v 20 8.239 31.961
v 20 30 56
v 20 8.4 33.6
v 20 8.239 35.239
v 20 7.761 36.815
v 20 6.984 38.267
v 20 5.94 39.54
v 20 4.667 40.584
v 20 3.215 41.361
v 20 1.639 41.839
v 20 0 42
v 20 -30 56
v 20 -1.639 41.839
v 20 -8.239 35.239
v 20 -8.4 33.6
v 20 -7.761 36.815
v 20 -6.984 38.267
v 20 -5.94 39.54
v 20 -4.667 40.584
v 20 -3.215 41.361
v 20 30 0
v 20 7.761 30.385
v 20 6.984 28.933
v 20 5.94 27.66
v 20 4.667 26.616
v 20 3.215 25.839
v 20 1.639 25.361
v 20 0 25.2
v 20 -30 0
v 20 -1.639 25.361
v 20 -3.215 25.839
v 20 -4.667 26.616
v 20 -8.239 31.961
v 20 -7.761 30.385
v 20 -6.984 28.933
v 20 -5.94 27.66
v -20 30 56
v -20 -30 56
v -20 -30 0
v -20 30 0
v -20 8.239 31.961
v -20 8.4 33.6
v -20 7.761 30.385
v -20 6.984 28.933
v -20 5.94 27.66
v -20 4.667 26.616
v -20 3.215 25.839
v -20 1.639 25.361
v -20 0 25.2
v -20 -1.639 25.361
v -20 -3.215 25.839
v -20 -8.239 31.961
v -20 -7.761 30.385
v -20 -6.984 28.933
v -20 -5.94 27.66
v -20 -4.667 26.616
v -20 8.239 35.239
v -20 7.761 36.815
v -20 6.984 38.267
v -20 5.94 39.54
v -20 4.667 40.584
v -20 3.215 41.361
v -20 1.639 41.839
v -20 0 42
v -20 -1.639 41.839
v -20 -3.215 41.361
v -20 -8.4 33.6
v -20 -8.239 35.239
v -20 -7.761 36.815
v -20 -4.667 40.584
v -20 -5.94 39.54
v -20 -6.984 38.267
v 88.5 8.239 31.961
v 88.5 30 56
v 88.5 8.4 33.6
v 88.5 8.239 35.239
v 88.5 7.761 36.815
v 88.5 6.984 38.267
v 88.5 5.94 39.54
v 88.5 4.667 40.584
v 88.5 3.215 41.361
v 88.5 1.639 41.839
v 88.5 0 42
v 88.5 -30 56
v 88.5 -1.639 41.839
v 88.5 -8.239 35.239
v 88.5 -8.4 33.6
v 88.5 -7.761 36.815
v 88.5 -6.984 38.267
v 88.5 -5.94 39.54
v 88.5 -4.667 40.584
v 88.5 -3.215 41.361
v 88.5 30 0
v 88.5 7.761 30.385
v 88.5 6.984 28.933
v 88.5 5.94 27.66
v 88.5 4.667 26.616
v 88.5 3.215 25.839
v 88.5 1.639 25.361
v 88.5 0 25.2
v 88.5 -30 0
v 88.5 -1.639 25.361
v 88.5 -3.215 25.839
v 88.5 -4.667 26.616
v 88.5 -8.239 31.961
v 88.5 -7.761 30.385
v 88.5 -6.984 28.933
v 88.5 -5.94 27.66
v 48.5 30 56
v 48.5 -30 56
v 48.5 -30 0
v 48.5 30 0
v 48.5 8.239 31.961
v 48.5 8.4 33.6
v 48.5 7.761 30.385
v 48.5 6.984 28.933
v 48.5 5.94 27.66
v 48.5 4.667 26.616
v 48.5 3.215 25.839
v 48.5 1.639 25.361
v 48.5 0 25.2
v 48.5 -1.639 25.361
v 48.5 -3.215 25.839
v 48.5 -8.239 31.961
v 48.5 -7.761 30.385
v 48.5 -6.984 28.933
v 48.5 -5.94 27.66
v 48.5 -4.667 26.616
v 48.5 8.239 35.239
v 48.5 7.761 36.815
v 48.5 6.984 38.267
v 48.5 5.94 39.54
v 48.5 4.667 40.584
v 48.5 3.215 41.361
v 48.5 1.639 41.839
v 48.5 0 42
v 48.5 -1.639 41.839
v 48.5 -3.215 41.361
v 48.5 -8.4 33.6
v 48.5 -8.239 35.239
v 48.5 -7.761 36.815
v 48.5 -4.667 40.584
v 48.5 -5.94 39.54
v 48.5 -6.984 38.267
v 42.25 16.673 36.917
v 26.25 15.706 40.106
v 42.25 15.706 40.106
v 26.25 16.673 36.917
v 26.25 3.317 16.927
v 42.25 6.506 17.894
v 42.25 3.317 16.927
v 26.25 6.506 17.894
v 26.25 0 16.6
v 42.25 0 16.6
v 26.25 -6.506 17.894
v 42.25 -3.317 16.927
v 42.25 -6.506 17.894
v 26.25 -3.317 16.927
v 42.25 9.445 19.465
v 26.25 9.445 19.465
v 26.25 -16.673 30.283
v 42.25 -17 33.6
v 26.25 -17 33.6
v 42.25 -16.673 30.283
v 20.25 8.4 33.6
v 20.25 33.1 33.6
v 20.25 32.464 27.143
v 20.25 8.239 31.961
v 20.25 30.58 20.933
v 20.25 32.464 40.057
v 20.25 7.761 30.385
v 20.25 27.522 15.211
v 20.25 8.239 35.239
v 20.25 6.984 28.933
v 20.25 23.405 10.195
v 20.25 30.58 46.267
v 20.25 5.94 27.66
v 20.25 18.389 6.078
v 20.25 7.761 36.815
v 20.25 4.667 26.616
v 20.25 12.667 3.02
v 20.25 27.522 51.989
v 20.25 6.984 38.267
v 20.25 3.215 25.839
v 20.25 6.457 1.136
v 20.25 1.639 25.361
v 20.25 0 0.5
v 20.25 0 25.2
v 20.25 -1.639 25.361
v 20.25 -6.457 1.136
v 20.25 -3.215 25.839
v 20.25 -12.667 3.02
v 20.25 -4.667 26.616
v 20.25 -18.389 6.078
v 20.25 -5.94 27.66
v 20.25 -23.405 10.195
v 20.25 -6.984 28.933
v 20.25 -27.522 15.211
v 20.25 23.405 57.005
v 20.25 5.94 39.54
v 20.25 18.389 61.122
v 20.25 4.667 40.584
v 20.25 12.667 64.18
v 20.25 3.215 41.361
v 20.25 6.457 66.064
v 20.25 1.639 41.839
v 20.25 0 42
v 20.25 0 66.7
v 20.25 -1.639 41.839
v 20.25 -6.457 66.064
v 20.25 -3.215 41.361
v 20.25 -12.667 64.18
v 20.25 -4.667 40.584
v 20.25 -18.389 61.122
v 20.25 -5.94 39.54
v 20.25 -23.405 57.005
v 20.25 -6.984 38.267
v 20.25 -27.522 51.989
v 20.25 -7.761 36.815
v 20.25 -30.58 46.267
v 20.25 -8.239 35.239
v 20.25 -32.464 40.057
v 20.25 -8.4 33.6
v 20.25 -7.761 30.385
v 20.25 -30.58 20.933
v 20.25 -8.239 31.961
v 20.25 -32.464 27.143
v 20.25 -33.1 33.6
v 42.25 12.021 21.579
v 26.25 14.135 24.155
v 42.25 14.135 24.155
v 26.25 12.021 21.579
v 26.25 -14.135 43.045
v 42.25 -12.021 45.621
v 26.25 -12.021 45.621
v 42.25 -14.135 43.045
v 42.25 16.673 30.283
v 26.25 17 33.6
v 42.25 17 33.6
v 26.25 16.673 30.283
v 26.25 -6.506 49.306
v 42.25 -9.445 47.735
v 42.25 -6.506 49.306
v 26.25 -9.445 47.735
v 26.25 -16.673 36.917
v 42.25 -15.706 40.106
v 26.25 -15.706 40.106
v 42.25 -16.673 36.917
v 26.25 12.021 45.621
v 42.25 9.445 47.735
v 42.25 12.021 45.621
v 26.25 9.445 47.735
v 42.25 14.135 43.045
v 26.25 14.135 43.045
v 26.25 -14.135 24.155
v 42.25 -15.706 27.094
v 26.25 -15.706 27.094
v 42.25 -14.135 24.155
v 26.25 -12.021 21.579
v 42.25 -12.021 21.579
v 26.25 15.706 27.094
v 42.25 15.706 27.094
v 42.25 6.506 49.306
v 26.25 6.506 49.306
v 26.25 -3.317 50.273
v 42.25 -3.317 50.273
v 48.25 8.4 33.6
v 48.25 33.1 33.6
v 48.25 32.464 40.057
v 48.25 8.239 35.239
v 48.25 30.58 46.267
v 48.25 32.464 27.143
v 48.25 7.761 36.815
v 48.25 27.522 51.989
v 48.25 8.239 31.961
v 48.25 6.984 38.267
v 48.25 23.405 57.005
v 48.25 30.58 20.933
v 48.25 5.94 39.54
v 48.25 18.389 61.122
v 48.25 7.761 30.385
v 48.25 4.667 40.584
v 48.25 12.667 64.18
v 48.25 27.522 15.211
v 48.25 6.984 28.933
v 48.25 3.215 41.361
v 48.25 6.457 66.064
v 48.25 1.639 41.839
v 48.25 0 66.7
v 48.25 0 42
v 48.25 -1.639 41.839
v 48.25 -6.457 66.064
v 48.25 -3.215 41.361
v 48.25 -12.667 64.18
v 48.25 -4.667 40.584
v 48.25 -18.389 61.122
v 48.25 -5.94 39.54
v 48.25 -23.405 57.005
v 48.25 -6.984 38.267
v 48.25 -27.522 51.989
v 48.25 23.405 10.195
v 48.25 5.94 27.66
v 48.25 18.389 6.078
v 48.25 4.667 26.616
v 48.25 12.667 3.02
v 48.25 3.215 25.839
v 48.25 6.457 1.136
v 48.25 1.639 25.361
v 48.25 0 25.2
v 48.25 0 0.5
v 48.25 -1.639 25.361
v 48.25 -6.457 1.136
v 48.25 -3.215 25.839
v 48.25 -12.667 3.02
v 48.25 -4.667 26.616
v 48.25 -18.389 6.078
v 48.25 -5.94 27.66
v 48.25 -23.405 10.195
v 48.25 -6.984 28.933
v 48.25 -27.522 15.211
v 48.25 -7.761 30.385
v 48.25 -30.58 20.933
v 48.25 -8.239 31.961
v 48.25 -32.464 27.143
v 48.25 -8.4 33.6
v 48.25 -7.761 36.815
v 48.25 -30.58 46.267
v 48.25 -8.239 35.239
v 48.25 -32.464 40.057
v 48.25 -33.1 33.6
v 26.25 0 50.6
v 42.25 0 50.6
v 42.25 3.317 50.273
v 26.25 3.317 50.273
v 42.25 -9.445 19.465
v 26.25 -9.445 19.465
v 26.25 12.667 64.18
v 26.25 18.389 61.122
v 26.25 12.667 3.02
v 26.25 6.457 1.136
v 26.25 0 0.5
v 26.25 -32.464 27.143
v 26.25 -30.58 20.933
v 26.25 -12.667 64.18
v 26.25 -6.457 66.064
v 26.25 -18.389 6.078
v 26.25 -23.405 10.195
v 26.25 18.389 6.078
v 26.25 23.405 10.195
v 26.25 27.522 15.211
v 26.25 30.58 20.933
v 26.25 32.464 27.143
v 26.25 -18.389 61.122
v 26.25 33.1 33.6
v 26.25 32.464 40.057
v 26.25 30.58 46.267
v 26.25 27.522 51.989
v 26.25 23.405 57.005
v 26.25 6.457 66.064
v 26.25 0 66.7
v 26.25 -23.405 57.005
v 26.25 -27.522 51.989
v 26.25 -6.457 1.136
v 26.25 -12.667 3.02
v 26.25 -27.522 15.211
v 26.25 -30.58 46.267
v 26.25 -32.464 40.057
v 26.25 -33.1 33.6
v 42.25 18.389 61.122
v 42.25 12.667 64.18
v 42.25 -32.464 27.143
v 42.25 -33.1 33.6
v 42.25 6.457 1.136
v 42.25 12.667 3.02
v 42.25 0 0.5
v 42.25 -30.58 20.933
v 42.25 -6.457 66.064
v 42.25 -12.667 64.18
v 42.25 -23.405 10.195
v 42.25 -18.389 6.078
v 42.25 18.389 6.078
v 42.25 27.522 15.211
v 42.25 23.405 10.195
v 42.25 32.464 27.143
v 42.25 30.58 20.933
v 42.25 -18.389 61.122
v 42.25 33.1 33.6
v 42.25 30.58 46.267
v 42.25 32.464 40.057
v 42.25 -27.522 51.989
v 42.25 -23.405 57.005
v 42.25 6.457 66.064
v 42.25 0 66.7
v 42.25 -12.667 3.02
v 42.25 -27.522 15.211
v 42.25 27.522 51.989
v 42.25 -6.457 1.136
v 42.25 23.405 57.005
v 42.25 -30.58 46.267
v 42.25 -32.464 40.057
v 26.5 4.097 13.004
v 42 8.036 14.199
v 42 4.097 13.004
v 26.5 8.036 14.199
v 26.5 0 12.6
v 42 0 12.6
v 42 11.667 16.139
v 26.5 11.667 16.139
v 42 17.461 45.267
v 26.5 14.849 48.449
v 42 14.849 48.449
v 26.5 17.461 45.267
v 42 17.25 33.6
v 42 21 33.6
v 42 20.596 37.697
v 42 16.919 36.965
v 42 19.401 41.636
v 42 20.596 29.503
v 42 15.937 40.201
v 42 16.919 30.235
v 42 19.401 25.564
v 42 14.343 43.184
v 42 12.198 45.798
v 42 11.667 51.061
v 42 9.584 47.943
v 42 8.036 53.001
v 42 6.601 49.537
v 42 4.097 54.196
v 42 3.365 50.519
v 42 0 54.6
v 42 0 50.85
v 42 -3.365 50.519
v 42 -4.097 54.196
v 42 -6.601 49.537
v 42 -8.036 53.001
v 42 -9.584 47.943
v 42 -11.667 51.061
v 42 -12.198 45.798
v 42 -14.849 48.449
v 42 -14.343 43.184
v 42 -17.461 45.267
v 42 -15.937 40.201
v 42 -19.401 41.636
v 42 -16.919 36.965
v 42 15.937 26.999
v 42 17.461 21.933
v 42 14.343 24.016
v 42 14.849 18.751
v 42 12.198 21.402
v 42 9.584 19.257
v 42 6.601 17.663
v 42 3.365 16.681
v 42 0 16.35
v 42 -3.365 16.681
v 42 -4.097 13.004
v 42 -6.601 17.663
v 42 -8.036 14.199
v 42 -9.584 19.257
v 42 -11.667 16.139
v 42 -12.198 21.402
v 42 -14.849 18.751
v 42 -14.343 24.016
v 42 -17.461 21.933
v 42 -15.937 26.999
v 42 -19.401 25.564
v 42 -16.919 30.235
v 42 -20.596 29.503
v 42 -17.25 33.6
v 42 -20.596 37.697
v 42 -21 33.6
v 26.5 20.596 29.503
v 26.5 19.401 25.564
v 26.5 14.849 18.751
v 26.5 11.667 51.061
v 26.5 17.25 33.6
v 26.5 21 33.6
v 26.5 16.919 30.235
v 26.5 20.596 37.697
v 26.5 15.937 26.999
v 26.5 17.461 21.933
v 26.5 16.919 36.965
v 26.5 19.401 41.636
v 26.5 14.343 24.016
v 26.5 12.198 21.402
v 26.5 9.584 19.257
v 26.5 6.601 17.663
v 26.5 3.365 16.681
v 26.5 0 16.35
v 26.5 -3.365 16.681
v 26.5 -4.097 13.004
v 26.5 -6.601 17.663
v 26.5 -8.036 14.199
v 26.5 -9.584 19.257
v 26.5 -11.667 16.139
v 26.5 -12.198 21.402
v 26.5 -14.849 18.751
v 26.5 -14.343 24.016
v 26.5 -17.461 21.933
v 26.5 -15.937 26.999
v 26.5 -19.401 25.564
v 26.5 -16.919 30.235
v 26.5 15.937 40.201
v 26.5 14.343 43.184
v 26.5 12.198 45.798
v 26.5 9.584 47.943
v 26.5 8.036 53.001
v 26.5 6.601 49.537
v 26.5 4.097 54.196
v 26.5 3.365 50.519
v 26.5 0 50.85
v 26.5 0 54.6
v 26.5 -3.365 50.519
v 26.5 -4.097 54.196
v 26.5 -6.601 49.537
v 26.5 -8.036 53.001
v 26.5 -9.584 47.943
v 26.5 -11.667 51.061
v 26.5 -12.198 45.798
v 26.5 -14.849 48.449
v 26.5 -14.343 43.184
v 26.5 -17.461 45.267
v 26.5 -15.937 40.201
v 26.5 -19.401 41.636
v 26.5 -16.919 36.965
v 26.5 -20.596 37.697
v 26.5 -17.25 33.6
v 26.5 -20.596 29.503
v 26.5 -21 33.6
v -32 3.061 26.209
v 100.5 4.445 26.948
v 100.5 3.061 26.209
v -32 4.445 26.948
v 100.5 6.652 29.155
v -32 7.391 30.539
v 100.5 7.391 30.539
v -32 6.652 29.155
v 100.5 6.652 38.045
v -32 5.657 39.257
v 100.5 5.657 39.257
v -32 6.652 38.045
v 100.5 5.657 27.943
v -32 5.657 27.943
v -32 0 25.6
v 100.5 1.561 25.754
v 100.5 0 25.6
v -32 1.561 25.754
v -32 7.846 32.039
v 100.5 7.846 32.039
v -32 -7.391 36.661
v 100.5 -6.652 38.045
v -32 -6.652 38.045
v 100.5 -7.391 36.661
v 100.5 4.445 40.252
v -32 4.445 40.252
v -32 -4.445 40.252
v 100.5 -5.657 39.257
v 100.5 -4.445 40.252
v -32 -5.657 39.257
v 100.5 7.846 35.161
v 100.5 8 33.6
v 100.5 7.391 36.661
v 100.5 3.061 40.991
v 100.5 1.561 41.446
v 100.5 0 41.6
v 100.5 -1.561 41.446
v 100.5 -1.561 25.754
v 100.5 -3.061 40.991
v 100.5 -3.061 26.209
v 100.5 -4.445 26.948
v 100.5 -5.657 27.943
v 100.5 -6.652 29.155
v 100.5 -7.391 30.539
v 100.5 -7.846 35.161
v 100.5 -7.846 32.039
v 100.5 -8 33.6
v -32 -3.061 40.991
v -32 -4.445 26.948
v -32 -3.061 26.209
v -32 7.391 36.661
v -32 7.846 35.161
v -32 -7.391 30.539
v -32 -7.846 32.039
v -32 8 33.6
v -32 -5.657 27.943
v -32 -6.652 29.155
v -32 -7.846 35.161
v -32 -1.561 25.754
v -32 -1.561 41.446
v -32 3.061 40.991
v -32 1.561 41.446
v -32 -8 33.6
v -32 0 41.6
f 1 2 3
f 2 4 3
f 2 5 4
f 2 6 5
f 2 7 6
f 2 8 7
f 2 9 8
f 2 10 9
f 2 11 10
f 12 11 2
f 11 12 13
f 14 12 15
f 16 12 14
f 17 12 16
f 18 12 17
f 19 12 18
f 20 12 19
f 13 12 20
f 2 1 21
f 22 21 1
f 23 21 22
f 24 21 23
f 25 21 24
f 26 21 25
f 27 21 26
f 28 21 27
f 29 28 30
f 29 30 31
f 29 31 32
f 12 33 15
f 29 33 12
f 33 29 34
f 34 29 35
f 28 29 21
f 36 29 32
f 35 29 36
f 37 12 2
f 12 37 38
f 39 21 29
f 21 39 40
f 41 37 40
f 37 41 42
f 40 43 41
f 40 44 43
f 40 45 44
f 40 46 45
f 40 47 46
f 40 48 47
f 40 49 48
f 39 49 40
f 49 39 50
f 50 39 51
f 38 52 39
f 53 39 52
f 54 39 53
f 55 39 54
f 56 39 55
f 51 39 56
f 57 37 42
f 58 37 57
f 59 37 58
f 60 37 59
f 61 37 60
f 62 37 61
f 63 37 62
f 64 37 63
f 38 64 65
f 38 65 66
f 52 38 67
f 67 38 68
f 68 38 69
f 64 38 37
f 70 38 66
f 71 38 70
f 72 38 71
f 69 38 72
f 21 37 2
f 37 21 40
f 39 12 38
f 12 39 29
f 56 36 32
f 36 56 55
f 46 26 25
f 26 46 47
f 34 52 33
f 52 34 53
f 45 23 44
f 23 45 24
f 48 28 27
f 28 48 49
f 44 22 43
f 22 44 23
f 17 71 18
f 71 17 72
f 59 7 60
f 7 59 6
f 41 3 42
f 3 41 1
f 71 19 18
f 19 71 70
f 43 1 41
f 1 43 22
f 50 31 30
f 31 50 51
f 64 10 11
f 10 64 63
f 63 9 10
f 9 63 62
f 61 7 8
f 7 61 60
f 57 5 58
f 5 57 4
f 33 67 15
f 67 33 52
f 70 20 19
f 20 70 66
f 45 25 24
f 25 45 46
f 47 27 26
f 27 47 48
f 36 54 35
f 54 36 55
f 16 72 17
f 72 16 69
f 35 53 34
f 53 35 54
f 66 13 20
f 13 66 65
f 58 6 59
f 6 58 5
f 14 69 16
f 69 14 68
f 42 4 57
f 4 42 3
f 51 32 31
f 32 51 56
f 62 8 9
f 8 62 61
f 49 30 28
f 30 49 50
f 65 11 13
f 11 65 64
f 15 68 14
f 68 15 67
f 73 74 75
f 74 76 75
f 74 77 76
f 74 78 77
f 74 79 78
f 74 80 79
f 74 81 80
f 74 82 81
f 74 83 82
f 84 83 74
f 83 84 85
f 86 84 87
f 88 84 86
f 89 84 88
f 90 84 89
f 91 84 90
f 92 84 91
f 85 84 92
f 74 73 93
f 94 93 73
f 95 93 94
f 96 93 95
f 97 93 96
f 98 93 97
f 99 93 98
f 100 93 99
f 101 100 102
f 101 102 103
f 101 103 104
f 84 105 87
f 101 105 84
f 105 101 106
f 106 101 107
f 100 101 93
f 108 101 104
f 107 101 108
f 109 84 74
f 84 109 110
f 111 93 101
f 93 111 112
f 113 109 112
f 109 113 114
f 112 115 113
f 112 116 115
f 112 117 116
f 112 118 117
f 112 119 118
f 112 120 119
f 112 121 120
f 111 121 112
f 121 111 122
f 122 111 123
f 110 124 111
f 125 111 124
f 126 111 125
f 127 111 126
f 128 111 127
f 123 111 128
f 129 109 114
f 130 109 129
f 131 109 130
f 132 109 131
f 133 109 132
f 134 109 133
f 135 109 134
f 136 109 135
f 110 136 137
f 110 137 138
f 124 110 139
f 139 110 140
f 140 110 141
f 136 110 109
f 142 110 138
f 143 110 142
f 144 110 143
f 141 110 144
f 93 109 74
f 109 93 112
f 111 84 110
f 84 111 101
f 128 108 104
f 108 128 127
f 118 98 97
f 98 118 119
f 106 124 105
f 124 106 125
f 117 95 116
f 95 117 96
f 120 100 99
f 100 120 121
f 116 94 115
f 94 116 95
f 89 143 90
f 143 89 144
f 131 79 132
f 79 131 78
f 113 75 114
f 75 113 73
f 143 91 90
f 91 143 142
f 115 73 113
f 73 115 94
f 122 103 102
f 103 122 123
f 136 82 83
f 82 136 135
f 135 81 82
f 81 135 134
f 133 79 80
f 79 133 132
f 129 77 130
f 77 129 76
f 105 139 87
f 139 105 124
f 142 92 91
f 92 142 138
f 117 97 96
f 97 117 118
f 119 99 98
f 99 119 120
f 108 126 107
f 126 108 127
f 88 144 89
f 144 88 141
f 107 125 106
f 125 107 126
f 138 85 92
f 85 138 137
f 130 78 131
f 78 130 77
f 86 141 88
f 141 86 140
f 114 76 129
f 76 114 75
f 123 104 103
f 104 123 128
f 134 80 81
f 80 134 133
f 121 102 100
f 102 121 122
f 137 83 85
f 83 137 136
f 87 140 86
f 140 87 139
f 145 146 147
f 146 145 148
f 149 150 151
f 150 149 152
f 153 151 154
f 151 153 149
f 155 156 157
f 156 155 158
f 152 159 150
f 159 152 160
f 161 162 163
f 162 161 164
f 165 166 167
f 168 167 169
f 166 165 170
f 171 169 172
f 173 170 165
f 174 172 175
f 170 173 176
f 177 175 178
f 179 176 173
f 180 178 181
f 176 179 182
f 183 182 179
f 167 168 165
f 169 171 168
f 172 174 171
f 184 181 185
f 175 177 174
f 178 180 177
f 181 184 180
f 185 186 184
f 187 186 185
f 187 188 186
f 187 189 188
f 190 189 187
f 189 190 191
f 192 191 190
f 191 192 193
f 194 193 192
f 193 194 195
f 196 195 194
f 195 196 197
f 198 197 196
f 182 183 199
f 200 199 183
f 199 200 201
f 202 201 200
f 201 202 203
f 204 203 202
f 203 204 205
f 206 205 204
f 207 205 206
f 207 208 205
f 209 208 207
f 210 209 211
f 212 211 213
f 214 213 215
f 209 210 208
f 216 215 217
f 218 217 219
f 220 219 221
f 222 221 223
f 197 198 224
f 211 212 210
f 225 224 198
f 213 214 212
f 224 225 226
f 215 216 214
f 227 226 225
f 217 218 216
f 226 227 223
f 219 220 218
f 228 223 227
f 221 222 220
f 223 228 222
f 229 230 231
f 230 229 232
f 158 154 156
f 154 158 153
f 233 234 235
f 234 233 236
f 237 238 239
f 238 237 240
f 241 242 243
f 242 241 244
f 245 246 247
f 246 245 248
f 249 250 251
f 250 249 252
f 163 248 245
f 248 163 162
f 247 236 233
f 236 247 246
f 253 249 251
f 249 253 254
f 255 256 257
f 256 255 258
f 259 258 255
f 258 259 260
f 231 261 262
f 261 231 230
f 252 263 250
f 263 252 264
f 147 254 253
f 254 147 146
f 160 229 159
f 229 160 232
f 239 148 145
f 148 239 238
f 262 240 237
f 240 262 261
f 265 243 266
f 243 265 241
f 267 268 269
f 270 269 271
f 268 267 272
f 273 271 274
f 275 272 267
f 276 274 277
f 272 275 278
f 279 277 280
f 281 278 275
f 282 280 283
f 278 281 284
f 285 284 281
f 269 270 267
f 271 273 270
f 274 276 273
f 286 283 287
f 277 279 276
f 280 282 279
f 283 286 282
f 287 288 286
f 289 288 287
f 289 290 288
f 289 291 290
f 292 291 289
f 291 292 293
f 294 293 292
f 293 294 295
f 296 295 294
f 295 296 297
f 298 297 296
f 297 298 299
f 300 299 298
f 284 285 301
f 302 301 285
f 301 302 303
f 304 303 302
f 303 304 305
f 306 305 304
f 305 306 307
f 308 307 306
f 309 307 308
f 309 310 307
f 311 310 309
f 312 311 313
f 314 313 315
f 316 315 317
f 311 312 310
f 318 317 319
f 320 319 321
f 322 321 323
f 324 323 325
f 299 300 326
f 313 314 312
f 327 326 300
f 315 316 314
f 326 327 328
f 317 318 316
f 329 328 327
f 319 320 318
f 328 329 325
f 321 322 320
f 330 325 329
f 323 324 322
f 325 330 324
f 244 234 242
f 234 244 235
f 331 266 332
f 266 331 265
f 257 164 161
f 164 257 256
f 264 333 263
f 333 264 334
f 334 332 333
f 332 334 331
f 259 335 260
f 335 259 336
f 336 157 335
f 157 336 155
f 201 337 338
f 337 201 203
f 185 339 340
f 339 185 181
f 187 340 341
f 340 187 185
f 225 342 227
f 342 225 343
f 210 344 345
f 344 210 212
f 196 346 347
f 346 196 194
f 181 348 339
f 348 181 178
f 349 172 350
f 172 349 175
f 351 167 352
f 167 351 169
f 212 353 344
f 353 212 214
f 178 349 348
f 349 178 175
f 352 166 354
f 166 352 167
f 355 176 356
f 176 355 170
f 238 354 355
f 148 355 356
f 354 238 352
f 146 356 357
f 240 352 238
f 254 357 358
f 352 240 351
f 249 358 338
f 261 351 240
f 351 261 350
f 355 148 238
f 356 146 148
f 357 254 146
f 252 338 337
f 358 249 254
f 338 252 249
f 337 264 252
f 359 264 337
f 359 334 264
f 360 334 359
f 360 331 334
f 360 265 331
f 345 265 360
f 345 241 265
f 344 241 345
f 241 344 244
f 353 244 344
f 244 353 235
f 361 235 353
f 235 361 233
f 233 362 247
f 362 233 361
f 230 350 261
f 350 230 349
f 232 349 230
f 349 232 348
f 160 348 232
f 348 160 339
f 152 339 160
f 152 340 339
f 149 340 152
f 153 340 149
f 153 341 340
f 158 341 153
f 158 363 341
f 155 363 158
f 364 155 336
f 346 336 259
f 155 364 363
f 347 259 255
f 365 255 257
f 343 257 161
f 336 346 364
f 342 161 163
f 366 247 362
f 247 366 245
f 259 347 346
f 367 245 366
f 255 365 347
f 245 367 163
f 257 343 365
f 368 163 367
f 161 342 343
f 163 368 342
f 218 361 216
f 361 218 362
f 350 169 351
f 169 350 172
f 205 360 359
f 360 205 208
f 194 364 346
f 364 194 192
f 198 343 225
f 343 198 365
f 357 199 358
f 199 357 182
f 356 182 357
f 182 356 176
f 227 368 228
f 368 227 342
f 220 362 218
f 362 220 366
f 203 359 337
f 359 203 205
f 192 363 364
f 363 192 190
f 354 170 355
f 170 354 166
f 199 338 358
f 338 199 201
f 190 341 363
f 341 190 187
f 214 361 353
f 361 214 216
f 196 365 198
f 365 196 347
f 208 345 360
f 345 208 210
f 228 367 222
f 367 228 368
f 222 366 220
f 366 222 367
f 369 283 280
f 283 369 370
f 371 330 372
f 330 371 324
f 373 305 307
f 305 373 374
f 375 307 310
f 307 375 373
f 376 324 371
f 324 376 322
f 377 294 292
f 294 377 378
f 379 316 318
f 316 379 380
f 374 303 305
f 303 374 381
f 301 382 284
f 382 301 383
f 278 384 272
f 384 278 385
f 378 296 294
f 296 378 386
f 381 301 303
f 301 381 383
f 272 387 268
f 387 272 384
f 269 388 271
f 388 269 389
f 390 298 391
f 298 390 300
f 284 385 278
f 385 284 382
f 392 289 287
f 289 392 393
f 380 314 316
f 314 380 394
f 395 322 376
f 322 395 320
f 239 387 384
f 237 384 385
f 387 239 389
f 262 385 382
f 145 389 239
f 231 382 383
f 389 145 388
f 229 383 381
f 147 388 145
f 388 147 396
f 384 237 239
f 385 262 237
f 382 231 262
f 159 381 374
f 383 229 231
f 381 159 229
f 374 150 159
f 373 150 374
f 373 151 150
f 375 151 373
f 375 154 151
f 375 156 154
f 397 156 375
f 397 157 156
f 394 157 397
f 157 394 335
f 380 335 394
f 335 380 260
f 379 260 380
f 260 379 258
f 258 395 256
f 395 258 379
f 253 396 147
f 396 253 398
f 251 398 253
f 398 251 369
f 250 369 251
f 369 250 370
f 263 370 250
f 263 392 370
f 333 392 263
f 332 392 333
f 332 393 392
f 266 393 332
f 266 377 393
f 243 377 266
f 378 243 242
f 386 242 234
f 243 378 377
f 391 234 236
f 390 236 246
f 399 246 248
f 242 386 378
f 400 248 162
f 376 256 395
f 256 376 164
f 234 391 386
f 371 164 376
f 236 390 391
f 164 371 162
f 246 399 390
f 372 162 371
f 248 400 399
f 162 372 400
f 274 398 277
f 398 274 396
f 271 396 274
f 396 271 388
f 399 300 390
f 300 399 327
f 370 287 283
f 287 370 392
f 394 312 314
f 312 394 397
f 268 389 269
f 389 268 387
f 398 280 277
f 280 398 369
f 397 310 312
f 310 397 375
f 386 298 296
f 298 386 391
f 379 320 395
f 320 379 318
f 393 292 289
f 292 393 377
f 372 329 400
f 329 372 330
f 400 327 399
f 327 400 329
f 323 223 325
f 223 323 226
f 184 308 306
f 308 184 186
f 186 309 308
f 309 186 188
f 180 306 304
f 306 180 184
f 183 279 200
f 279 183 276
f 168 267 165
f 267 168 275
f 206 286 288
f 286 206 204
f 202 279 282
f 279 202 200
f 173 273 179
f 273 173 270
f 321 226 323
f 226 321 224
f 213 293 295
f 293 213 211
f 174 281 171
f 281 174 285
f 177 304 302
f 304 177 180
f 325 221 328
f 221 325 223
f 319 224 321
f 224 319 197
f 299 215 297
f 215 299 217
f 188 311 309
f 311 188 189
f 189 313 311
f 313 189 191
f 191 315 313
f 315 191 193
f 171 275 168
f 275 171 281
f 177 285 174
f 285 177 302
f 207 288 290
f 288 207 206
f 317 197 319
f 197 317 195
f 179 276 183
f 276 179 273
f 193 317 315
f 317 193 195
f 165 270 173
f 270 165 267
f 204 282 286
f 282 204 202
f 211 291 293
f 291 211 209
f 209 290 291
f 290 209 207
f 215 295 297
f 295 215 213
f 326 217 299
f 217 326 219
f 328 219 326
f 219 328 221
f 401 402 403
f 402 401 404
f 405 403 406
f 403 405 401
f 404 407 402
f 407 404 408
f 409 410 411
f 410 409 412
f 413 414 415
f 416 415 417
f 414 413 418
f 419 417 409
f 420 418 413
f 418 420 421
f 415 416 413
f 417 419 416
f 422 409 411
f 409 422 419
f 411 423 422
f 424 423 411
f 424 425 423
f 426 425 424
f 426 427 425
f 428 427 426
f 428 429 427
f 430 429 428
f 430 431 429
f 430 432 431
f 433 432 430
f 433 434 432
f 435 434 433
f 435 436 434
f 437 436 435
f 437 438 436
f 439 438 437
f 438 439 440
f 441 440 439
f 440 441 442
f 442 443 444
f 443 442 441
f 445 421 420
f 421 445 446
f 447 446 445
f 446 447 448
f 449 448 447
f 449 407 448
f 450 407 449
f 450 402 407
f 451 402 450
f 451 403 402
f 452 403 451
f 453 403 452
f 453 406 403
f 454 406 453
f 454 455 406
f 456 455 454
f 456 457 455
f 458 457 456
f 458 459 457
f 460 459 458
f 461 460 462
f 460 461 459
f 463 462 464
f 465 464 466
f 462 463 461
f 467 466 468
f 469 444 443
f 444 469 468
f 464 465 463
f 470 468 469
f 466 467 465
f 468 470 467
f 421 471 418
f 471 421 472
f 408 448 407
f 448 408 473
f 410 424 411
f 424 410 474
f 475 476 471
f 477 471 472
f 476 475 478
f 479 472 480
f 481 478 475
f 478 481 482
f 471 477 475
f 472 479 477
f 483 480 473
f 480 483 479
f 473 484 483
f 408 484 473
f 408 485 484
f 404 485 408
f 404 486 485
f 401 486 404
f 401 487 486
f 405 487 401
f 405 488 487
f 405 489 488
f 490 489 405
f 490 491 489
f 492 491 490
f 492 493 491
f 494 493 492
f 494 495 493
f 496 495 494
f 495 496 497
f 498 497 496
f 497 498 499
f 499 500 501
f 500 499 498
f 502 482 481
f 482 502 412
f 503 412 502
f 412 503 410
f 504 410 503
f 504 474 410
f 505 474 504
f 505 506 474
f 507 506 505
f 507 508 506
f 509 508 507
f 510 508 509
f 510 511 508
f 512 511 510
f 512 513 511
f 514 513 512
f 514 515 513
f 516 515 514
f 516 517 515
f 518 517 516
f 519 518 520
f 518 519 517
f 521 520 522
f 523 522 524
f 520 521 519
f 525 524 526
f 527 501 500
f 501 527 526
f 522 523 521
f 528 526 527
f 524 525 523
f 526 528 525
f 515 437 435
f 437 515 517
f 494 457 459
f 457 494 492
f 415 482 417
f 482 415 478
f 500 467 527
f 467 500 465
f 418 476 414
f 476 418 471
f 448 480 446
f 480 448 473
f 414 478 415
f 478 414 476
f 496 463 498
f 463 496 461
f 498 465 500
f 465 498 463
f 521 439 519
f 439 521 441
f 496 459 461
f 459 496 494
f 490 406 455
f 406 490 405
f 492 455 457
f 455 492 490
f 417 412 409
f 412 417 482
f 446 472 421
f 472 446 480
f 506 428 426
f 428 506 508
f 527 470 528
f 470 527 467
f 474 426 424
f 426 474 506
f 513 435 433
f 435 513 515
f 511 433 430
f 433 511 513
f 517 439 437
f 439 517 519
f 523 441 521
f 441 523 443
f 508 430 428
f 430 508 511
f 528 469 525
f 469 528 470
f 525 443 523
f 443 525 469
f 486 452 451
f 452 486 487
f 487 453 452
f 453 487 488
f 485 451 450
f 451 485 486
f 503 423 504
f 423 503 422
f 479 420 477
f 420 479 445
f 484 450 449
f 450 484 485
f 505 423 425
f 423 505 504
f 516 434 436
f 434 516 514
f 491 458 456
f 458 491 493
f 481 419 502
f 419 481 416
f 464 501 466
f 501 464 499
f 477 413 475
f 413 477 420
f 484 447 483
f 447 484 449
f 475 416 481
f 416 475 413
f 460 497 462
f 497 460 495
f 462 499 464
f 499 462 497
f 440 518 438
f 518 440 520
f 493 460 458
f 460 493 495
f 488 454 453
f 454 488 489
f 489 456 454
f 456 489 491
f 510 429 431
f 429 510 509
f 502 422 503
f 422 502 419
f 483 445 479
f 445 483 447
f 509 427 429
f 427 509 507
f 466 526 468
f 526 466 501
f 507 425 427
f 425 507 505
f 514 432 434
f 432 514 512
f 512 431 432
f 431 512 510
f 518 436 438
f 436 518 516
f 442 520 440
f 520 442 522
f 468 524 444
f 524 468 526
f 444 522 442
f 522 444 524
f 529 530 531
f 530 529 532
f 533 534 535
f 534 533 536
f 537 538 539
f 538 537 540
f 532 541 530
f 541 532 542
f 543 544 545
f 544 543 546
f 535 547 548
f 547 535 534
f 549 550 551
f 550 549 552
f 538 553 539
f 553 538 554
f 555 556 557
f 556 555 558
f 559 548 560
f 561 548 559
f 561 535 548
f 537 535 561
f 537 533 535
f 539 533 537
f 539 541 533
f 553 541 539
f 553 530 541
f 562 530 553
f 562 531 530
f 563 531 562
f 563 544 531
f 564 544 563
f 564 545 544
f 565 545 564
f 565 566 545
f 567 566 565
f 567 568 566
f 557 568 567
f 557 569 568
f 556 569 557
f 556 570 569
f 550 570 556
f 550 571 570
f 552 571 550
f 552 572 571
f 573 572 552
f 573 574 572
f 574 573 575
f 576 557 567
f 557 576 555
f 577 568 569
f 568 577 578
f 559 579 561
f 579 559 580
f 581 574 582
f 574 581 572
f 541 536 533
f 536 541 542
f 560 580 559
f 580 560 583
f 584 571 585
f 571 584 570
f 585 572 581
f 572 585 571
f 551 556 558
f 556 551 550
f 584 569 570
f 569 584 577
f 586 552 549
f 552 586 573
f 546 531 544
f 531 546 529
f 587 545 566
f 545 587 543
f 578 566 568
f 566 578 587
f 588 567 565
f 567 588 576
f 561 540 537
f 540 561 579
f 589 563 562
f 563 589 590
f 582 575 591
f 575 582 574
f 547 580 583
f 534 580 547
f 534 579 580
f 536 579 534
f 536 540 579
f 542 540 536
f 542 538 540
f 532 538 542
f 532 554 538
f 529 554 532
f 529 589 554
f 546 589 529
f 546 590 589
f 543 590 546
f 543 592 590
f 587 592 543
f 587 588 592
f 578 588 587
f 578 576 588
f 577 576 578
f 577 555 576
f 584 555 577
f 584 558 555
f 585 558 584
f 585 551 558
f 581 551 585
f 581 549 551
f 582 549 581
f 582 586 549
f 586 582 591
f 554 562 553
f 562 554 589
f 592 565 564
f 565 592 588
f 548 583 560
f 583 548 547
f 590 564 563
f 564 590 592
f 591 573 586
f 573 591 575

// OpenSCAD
$fn = 32;

// ------------------------------------------------------------------------
// Pulley assembly: d66.2 pulley with a belt, shaft d16
// Every part is its own module, assembly() places them once.
// ------------------------------------------------------------------------

// --- part 1 ---
module support1() {
  difference() {
    translate([-20, -30, 0]) cube([40, 60, 56]);
    translate([0, 0, 33.6]) rotate([0, 90, 0]) cylinder(h = 42, d = 16.8, center = true);
  }
}

// --- part 2 ---
module support2() {
  difference() {
    translate([-20, -30, 0]) cube([40, 60, 56]);
    translate([0, 0, 33.6]) rotate([0, 90, 0]) cylinder(h = 42, d = 16.8, center = true);
  }
}

// --- part 3 ---
module shaft() {
  translate([0, 0, -66.25]) cylinder(h = 132.5, d = 16);
}

// --- part 4 ---
module pulley() {
  difference() {
    union() {
      cylinder(h = 28, d = 34);
      cylinder(h = 6, d = 66.2);
      translate([0, 0, 22]) cylinder(h = 6, d = 66.2);
    }
    translate([0, 0, -1]) cylinder(h = 30, d = 16.8);
  }
}

// --- part 5 ---
module belt() {
  difference() {
      translate([0, 0, 0]) cylinder(h = 15.5, d = 42);
      translate([0, 0, -1]) cylinder(h = 17.5, d = 34.5);
    }
}

// --- assembly ---
module assembly() {
  translate([0, 0, 0]) rotate([0, 0, 0]) support1();
  translate([68.5, 0, 0]) rotate([0, 0, 0]) support2();
  translate([34.25, 0, 33.6]) rotate([0, 90, 0]) shaft();
  translate([20.25, 0, 33.6]) rotate([0, 90, 0]) pulley();
  translate([26.5, 0, 33.6]) rotate([0, 90, 0]) belt();
}

assembly();
